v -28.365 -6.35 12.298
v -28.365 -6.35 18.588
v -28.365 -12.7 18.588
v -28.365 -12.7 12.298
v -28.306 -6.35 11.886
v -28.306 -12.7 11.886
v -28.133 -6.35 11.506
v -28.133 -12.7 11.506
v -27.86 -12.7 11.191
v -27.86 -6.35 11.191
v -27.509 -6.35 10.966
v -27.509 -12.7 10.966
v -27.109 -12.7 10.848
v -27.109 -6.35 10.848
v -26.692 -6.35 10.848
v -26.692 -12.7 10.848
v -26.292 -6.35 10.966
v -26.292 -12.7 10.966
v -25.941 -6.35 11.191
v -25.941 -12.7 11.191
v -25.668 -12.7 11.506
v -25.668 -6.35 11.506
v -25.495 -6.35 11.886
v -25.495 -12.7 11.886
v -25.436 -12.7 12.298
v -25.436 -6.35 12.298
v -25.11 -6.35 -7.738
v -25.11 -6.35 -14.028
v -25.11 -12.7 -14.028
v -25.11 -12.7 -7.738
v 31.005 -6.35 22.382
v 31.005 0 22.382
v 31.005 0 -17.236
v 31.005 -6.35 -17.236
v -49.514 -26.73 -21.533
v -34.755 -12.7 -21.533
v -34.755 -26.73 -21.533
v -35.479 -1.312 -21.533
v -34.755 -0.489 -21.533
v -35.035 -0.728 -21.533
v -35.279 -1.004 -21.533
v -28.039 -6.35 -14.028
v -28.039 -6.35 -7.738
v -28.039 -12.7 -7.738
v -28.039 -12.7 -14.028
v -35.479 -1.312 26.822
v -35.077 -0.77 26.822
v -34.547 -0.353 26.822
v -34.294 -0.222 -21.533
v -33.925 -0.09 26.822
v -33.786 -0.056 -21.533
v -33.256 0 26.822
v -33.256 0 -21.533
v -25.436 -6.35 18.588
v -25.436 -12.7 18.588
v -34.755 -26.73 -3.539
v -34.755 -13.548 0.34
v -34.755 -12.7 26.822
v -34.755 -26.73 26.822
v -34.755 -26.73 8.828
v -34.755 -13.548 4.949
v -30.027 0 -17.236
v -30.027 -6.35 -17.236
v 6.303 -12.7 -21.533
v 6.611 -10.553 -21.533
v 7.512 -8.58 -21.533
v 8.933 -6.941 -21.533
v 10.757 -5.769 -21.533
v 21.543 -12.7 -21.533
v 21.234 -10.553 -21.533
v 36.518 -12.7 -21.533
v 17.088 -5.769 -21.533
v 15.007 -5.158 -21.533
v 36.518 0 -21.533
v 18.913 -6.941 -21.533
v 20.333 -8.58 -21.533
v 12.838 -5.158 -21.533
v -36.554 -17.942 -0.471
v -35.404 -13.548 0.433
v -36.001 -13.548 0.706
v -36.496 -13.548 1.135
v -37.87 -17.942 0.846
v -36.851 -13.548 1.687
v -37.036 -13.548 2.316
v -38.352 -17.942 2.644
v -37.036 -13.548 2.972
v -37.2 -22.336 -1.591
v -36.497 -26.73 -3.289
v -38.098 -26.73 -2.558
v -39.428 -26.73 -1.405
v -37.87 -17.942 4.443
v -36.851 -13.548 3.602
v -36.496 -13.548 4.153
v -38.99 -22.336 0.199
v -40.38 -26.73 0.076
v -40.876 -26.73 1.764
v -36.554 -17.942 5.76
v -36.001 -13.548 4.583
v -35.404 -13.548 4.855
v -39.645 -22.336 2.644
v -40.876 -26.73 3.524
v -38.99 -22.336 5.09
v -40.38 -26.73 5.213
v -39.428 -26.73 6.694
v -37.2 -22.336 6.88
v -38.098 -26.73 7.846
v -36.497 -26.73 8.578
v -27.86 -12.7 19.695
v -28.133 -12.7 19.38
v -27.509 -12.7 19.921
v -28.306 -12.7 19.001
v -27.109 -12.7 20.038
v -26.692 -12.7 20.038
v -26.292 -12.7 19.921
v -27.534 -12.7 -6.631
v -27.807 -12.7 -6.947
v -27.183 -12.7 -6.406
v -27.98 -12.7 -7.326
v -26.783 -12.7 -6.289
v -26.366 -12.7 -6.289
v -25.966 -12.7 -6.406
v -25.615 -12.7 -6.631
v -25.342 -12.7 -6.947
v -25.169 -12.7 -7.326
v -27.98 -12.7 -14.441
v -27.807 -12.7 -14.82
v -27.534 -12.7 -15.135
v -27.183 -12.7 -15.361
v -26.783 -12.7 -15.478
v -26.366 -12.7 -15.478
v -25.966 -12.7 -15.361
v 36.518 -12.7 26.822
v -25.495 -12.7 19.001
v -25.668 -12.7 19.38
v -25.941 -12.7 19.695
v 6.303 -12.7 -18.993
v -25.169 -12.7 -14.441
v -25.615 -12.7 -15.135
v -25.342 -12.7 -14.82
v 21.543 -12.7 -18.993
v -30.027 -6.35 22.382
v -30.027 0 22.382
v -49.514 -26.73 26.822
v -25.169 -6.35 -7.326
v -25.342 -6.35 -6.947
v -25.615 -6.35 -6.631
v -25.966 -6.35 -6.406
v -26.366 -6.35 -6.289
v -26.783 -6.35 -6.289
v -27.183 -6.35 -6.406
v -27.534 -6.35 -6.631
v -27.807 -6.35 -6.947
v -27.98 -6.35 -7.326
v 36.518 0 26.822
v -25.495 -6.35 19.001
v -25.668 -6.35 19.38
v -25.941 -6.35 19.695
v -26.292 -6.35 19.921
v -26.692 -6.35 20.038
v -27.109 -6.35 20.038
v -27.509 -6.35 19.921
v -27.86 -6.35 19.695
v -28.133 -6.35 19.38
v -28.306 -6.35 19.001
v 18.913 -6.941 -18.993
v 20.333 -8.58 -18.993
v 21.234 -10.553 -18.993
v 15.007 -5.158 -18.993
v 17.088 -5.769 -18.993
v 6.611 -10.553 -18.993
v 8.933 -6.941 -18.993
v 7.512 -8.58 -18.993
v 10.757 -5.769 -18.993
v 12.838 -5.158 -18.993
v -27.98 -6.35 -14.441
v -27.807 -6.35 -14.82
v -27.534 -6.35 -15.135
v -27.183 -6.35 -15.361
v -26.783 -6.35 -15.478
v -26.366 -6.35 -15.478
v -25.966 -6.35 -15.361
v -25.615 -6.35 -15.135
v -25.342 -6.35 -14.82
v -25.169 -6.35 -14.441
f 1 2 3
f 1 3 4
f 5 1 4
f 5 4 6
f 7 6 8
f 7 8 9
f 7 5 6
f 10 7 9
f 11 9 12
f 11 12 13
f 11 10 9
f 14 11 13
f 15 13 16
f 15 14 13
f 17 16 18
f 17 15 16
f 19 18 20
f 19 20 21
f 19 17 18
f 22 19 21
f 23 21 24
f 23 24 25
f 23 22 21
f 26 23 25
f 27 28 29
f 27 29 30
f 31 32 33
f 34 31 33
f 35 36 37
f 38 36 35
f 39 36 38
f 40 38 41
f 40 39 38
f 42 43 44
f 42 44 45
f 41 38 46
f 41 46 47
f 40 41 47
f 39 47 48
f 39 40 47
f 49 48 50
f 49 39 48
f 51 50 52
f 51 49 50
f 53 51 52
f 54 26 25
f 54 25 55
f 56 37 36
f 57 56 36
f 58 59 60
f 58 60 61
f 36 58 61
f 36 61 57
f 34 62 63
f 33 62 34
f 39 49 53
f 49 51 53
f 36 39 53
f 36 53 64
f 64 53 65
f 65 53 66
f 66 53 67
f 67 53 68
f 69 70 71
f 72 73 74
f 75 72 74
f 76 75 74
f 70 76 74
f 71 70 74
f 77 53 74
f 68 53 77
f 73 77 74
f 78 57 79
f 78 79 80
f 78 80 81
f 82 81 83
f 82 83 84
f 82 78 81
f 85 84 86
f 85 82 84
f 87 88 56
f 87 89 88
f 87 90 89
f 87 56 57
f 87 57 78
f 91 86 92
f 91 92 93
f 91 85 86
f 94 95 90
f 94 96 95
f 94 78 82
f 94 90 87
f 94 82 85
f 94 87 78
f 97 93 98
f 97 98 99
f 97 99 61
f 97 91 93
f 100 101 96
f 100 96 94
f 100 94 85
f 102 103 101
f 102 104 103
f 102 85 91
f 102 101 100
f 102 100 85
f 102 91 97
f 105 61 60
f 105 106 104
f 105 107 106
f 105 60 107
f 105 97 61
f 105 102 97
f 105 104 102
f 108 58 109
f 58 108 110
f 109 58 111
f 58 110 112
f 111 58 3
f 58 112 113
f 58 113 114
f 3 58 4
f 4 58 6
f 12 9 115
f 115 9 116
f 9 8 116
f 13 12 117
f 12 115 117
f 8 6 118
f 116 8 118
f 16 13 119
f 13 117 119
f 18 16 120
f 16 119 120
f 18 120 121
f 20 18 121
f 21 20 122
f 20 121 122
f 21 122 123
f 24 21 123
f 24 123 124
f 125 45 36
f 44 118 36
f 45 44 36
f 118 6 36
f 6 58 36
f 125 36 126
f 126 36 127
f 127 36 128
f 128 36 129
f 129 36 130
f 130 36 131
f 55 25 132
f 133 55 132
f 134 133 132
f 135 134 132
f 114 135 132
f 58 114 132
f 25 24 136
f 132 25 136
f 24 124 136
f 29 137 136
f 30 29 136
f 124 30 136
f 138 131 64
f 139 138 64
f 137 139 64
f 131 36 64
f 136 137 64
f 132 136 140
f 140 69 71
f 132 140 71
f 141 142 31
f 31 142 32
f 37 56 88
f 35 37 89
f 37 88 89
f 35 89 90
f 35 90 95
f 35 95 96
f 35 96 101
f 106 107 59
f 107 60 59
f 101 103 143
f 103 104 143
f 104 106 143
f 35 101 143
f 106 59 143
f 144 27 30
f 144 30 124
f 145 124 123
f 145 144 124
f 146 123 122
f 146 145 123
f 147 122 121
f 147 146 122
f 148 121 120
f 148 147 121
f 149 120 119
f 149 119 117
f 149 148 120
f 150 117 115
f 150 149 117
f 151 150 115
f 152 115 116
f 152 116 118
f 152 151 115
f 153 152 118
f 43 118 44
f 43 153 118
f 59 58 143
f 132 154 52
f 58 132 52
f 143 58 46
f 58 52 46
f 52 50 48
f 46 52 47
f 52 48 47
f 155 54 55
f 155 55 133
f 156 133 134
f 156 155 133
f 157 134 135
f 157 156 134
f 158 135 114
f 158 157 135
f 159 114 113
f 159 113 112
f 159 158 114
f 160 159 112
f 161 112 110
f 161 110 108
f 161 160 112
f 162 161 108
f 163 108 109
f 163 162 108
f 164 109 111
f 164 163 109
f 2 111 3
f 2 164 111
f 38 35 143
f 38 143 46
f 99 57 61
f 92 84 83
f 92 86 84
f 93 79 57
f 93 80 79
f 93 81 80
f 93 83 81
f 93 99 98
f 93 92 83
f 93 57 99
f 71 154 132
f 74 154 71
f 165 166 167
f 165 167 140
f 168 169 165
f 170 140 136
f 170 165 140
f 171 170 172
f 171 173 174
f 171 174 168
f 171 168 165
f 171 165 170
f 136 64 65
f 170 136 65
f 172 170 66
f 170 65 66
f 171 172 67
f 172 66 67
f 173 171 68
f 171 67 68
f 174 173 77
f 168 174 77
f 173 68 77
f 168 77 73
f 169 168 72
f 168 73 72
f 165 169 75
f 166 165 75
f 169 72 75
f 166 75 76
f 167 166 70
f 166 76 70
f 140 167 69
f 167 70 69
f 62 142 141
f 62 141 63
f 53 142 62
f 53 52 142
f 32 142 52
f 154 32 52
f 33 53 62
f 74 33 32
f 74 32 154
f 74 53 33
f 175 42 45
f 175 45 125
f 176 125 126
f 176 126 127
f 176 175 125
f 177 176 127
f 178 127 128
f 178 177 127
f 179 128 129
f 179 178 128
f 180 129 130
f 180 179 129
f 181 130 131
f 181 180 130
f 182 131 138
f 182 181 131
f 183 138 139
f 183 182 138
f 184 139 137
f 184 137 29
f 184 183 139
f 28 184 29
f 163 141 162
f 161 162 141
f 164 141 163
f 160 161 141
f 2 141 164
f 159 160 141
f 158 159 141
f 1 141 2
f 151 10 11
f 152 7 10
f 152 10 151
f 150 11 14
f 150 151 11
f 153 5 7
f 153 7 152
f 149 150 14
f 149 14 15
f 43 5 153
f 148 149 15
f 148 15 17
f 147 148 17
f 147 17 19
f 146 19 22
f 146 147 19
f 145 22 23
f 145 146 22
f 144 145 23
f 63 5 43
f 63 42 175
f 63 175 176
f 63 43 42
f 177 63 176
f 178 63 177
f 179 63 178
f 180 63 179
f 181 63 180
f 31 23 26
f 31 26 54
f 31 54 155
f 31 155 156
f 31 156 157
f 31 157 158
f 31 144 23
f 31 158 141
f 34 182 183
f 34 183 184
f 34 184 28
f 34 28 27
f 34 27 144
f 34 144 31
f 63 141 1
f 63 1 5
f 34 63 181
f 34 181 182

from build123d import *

# Parameters (mm, degrees)
SKETCH1_W           = 71.272685497
SKETCH1_H           = 48.354613482
BOSS_EXTRUDE1_DEPTH = 12.7
SKETCH2_W           = 61.031917372
SKETCH2_H           = 39.617209522
CUT_EXTRUDE1_DEPTH  = 6.35
BOSS_EXTRUDE2_DEPTH = 48.354613
FILLET1_R           = 2.54
SKETCH5_R           = 7.62
CUT_EXTRUDE2_DEPTH  = 2.54
CUT_EXTRUDE3_DEPTH  = 6.35
CUT_REVOLVE1_ANGLE  = 180


with BuildPart() as part:
    # Sketch1 → Boss-Extrude1 (new body)
    with BuildSketch(Plane(origin=(0, 0, 0), x_dir=(1, 0, 0), z_dir=(0, 1, 0))):
        with Locations((0.881464309, -2.644392925)):
            Rectangle(SKETCH1_W, SKETCH1_H)
    extrude(amount=-BOSS_EXTRUDE1_DEPTH)

    # Sketch2 → Cut-Extrude1 (cut)
    with BuildSketch(Plane(origin=(0, 0, 0), x_dir=(1, 0, 0), z_dir=(0, 1, 0))):
        with Locations((0.488861331, -2.573010565)):
            Rectangle(SKETCH2_W, SKETCH2_H)
    extrude(amount=-CUT_EXTRUDE1_DEPTH, mode=Mode.SUBTRACT)

    # Sketch4 → Boss-Extrude2 (add)
    with BuildSketch(Plane.XY.offset(26.821699666)):
        Polygon((-34.75487844, -12.7), (-34.75487844, -26.729663637), (-49.514481499, -26.729663637), (-34.75487844, 0), align=None)
    extrude(amount=-BOSS_EXTRUDE2_DEPTH)

    # Fillet1
    fillet1_edges = [part.edges().sort_by_distance(p)[0] for p in [
        (-34.75487844, 0, 2.644392925),
    ]]
    fillet(fillet1_edges, radius=FILLET1_R)

    # Sketch5 → Cut-Extrude2 (cut)
    with BuildSketch(Plane(origin=(0, 0, -21.532913816), x_dir=(-1, 0, 0), z_dir=(0, 0, -1))):
        with Locations((-13.922709082, -12.7)):
            Circle(SKETCH5_R)
    extrude(amount=-CUT_EXTRUDE2_DEPTH, mode=Mode.SUBTRACT)

    # Sketch7 → Cut-Extrude3 (cut)
    with BuildSketch(Plane(origin=(0, -6.35, 0), x_dir=(1, 0, 0), z_dir=(0, 1, 0))):
        with BuildLine():
            Line((-25.109899832, 14.028476446), (-25.109899832, 7.738453376))
            ThreePointArc((-25.109899832, 7.738453376), (-26.574699725, 6.273653483), (-28.039499618, 7.738453376))
            Line((-28.039499618, 7.738453376), (-28.039499618, 14.028476446))
            ThreePointArc((-28.039499618, 14.028476446), (-26.574699725, 15.493276339), (-25.109899832, 14.028476446))
        make_face()
        with BuildLine():
            Line((-25.435843167, -12.298214097), (-25.435843167, -18.588237167))
            ThreePointArc((-25.435843167, -18.588237167), (-26.90064306, -20.05303706), (-28.365442953, -18.588237167))
            Line((-28.365442953, -18.588237167), (-28.365442953, -12.298214097))
            ThreePointArc((-28.365442953, -12.298214097), (-26.90064306, -10.833414204), (-25.435843167, -12.298214097))
        make_face()
    extrude(amount=-CUT_EXTRUDE3_DEPTH, mode=Mode.SUBTRACT)

    # Sketch9 → Cut-Revolve1 (revolve, cut)
    with BuildSketch(Plane(origin=(-34.75487844, 0, 0), x_dir=(0, 0, -1), z_dir=(1, 0, 0))):
        Polygon((-2.644392925, -26.729663637), (-2.644392925, -13.548328756), (-0.340047454, -13.548328756), (3.5393378, -26.729663637), align=None)
    revolve(axis=Axis((-34.75487844, -26.729663637, 2.644392925), (0, 1, 0)), revolution_arc=CUT_REVOLVE1_ANGLE, mode=Mode.SUBTRACT)


solid = part.part
